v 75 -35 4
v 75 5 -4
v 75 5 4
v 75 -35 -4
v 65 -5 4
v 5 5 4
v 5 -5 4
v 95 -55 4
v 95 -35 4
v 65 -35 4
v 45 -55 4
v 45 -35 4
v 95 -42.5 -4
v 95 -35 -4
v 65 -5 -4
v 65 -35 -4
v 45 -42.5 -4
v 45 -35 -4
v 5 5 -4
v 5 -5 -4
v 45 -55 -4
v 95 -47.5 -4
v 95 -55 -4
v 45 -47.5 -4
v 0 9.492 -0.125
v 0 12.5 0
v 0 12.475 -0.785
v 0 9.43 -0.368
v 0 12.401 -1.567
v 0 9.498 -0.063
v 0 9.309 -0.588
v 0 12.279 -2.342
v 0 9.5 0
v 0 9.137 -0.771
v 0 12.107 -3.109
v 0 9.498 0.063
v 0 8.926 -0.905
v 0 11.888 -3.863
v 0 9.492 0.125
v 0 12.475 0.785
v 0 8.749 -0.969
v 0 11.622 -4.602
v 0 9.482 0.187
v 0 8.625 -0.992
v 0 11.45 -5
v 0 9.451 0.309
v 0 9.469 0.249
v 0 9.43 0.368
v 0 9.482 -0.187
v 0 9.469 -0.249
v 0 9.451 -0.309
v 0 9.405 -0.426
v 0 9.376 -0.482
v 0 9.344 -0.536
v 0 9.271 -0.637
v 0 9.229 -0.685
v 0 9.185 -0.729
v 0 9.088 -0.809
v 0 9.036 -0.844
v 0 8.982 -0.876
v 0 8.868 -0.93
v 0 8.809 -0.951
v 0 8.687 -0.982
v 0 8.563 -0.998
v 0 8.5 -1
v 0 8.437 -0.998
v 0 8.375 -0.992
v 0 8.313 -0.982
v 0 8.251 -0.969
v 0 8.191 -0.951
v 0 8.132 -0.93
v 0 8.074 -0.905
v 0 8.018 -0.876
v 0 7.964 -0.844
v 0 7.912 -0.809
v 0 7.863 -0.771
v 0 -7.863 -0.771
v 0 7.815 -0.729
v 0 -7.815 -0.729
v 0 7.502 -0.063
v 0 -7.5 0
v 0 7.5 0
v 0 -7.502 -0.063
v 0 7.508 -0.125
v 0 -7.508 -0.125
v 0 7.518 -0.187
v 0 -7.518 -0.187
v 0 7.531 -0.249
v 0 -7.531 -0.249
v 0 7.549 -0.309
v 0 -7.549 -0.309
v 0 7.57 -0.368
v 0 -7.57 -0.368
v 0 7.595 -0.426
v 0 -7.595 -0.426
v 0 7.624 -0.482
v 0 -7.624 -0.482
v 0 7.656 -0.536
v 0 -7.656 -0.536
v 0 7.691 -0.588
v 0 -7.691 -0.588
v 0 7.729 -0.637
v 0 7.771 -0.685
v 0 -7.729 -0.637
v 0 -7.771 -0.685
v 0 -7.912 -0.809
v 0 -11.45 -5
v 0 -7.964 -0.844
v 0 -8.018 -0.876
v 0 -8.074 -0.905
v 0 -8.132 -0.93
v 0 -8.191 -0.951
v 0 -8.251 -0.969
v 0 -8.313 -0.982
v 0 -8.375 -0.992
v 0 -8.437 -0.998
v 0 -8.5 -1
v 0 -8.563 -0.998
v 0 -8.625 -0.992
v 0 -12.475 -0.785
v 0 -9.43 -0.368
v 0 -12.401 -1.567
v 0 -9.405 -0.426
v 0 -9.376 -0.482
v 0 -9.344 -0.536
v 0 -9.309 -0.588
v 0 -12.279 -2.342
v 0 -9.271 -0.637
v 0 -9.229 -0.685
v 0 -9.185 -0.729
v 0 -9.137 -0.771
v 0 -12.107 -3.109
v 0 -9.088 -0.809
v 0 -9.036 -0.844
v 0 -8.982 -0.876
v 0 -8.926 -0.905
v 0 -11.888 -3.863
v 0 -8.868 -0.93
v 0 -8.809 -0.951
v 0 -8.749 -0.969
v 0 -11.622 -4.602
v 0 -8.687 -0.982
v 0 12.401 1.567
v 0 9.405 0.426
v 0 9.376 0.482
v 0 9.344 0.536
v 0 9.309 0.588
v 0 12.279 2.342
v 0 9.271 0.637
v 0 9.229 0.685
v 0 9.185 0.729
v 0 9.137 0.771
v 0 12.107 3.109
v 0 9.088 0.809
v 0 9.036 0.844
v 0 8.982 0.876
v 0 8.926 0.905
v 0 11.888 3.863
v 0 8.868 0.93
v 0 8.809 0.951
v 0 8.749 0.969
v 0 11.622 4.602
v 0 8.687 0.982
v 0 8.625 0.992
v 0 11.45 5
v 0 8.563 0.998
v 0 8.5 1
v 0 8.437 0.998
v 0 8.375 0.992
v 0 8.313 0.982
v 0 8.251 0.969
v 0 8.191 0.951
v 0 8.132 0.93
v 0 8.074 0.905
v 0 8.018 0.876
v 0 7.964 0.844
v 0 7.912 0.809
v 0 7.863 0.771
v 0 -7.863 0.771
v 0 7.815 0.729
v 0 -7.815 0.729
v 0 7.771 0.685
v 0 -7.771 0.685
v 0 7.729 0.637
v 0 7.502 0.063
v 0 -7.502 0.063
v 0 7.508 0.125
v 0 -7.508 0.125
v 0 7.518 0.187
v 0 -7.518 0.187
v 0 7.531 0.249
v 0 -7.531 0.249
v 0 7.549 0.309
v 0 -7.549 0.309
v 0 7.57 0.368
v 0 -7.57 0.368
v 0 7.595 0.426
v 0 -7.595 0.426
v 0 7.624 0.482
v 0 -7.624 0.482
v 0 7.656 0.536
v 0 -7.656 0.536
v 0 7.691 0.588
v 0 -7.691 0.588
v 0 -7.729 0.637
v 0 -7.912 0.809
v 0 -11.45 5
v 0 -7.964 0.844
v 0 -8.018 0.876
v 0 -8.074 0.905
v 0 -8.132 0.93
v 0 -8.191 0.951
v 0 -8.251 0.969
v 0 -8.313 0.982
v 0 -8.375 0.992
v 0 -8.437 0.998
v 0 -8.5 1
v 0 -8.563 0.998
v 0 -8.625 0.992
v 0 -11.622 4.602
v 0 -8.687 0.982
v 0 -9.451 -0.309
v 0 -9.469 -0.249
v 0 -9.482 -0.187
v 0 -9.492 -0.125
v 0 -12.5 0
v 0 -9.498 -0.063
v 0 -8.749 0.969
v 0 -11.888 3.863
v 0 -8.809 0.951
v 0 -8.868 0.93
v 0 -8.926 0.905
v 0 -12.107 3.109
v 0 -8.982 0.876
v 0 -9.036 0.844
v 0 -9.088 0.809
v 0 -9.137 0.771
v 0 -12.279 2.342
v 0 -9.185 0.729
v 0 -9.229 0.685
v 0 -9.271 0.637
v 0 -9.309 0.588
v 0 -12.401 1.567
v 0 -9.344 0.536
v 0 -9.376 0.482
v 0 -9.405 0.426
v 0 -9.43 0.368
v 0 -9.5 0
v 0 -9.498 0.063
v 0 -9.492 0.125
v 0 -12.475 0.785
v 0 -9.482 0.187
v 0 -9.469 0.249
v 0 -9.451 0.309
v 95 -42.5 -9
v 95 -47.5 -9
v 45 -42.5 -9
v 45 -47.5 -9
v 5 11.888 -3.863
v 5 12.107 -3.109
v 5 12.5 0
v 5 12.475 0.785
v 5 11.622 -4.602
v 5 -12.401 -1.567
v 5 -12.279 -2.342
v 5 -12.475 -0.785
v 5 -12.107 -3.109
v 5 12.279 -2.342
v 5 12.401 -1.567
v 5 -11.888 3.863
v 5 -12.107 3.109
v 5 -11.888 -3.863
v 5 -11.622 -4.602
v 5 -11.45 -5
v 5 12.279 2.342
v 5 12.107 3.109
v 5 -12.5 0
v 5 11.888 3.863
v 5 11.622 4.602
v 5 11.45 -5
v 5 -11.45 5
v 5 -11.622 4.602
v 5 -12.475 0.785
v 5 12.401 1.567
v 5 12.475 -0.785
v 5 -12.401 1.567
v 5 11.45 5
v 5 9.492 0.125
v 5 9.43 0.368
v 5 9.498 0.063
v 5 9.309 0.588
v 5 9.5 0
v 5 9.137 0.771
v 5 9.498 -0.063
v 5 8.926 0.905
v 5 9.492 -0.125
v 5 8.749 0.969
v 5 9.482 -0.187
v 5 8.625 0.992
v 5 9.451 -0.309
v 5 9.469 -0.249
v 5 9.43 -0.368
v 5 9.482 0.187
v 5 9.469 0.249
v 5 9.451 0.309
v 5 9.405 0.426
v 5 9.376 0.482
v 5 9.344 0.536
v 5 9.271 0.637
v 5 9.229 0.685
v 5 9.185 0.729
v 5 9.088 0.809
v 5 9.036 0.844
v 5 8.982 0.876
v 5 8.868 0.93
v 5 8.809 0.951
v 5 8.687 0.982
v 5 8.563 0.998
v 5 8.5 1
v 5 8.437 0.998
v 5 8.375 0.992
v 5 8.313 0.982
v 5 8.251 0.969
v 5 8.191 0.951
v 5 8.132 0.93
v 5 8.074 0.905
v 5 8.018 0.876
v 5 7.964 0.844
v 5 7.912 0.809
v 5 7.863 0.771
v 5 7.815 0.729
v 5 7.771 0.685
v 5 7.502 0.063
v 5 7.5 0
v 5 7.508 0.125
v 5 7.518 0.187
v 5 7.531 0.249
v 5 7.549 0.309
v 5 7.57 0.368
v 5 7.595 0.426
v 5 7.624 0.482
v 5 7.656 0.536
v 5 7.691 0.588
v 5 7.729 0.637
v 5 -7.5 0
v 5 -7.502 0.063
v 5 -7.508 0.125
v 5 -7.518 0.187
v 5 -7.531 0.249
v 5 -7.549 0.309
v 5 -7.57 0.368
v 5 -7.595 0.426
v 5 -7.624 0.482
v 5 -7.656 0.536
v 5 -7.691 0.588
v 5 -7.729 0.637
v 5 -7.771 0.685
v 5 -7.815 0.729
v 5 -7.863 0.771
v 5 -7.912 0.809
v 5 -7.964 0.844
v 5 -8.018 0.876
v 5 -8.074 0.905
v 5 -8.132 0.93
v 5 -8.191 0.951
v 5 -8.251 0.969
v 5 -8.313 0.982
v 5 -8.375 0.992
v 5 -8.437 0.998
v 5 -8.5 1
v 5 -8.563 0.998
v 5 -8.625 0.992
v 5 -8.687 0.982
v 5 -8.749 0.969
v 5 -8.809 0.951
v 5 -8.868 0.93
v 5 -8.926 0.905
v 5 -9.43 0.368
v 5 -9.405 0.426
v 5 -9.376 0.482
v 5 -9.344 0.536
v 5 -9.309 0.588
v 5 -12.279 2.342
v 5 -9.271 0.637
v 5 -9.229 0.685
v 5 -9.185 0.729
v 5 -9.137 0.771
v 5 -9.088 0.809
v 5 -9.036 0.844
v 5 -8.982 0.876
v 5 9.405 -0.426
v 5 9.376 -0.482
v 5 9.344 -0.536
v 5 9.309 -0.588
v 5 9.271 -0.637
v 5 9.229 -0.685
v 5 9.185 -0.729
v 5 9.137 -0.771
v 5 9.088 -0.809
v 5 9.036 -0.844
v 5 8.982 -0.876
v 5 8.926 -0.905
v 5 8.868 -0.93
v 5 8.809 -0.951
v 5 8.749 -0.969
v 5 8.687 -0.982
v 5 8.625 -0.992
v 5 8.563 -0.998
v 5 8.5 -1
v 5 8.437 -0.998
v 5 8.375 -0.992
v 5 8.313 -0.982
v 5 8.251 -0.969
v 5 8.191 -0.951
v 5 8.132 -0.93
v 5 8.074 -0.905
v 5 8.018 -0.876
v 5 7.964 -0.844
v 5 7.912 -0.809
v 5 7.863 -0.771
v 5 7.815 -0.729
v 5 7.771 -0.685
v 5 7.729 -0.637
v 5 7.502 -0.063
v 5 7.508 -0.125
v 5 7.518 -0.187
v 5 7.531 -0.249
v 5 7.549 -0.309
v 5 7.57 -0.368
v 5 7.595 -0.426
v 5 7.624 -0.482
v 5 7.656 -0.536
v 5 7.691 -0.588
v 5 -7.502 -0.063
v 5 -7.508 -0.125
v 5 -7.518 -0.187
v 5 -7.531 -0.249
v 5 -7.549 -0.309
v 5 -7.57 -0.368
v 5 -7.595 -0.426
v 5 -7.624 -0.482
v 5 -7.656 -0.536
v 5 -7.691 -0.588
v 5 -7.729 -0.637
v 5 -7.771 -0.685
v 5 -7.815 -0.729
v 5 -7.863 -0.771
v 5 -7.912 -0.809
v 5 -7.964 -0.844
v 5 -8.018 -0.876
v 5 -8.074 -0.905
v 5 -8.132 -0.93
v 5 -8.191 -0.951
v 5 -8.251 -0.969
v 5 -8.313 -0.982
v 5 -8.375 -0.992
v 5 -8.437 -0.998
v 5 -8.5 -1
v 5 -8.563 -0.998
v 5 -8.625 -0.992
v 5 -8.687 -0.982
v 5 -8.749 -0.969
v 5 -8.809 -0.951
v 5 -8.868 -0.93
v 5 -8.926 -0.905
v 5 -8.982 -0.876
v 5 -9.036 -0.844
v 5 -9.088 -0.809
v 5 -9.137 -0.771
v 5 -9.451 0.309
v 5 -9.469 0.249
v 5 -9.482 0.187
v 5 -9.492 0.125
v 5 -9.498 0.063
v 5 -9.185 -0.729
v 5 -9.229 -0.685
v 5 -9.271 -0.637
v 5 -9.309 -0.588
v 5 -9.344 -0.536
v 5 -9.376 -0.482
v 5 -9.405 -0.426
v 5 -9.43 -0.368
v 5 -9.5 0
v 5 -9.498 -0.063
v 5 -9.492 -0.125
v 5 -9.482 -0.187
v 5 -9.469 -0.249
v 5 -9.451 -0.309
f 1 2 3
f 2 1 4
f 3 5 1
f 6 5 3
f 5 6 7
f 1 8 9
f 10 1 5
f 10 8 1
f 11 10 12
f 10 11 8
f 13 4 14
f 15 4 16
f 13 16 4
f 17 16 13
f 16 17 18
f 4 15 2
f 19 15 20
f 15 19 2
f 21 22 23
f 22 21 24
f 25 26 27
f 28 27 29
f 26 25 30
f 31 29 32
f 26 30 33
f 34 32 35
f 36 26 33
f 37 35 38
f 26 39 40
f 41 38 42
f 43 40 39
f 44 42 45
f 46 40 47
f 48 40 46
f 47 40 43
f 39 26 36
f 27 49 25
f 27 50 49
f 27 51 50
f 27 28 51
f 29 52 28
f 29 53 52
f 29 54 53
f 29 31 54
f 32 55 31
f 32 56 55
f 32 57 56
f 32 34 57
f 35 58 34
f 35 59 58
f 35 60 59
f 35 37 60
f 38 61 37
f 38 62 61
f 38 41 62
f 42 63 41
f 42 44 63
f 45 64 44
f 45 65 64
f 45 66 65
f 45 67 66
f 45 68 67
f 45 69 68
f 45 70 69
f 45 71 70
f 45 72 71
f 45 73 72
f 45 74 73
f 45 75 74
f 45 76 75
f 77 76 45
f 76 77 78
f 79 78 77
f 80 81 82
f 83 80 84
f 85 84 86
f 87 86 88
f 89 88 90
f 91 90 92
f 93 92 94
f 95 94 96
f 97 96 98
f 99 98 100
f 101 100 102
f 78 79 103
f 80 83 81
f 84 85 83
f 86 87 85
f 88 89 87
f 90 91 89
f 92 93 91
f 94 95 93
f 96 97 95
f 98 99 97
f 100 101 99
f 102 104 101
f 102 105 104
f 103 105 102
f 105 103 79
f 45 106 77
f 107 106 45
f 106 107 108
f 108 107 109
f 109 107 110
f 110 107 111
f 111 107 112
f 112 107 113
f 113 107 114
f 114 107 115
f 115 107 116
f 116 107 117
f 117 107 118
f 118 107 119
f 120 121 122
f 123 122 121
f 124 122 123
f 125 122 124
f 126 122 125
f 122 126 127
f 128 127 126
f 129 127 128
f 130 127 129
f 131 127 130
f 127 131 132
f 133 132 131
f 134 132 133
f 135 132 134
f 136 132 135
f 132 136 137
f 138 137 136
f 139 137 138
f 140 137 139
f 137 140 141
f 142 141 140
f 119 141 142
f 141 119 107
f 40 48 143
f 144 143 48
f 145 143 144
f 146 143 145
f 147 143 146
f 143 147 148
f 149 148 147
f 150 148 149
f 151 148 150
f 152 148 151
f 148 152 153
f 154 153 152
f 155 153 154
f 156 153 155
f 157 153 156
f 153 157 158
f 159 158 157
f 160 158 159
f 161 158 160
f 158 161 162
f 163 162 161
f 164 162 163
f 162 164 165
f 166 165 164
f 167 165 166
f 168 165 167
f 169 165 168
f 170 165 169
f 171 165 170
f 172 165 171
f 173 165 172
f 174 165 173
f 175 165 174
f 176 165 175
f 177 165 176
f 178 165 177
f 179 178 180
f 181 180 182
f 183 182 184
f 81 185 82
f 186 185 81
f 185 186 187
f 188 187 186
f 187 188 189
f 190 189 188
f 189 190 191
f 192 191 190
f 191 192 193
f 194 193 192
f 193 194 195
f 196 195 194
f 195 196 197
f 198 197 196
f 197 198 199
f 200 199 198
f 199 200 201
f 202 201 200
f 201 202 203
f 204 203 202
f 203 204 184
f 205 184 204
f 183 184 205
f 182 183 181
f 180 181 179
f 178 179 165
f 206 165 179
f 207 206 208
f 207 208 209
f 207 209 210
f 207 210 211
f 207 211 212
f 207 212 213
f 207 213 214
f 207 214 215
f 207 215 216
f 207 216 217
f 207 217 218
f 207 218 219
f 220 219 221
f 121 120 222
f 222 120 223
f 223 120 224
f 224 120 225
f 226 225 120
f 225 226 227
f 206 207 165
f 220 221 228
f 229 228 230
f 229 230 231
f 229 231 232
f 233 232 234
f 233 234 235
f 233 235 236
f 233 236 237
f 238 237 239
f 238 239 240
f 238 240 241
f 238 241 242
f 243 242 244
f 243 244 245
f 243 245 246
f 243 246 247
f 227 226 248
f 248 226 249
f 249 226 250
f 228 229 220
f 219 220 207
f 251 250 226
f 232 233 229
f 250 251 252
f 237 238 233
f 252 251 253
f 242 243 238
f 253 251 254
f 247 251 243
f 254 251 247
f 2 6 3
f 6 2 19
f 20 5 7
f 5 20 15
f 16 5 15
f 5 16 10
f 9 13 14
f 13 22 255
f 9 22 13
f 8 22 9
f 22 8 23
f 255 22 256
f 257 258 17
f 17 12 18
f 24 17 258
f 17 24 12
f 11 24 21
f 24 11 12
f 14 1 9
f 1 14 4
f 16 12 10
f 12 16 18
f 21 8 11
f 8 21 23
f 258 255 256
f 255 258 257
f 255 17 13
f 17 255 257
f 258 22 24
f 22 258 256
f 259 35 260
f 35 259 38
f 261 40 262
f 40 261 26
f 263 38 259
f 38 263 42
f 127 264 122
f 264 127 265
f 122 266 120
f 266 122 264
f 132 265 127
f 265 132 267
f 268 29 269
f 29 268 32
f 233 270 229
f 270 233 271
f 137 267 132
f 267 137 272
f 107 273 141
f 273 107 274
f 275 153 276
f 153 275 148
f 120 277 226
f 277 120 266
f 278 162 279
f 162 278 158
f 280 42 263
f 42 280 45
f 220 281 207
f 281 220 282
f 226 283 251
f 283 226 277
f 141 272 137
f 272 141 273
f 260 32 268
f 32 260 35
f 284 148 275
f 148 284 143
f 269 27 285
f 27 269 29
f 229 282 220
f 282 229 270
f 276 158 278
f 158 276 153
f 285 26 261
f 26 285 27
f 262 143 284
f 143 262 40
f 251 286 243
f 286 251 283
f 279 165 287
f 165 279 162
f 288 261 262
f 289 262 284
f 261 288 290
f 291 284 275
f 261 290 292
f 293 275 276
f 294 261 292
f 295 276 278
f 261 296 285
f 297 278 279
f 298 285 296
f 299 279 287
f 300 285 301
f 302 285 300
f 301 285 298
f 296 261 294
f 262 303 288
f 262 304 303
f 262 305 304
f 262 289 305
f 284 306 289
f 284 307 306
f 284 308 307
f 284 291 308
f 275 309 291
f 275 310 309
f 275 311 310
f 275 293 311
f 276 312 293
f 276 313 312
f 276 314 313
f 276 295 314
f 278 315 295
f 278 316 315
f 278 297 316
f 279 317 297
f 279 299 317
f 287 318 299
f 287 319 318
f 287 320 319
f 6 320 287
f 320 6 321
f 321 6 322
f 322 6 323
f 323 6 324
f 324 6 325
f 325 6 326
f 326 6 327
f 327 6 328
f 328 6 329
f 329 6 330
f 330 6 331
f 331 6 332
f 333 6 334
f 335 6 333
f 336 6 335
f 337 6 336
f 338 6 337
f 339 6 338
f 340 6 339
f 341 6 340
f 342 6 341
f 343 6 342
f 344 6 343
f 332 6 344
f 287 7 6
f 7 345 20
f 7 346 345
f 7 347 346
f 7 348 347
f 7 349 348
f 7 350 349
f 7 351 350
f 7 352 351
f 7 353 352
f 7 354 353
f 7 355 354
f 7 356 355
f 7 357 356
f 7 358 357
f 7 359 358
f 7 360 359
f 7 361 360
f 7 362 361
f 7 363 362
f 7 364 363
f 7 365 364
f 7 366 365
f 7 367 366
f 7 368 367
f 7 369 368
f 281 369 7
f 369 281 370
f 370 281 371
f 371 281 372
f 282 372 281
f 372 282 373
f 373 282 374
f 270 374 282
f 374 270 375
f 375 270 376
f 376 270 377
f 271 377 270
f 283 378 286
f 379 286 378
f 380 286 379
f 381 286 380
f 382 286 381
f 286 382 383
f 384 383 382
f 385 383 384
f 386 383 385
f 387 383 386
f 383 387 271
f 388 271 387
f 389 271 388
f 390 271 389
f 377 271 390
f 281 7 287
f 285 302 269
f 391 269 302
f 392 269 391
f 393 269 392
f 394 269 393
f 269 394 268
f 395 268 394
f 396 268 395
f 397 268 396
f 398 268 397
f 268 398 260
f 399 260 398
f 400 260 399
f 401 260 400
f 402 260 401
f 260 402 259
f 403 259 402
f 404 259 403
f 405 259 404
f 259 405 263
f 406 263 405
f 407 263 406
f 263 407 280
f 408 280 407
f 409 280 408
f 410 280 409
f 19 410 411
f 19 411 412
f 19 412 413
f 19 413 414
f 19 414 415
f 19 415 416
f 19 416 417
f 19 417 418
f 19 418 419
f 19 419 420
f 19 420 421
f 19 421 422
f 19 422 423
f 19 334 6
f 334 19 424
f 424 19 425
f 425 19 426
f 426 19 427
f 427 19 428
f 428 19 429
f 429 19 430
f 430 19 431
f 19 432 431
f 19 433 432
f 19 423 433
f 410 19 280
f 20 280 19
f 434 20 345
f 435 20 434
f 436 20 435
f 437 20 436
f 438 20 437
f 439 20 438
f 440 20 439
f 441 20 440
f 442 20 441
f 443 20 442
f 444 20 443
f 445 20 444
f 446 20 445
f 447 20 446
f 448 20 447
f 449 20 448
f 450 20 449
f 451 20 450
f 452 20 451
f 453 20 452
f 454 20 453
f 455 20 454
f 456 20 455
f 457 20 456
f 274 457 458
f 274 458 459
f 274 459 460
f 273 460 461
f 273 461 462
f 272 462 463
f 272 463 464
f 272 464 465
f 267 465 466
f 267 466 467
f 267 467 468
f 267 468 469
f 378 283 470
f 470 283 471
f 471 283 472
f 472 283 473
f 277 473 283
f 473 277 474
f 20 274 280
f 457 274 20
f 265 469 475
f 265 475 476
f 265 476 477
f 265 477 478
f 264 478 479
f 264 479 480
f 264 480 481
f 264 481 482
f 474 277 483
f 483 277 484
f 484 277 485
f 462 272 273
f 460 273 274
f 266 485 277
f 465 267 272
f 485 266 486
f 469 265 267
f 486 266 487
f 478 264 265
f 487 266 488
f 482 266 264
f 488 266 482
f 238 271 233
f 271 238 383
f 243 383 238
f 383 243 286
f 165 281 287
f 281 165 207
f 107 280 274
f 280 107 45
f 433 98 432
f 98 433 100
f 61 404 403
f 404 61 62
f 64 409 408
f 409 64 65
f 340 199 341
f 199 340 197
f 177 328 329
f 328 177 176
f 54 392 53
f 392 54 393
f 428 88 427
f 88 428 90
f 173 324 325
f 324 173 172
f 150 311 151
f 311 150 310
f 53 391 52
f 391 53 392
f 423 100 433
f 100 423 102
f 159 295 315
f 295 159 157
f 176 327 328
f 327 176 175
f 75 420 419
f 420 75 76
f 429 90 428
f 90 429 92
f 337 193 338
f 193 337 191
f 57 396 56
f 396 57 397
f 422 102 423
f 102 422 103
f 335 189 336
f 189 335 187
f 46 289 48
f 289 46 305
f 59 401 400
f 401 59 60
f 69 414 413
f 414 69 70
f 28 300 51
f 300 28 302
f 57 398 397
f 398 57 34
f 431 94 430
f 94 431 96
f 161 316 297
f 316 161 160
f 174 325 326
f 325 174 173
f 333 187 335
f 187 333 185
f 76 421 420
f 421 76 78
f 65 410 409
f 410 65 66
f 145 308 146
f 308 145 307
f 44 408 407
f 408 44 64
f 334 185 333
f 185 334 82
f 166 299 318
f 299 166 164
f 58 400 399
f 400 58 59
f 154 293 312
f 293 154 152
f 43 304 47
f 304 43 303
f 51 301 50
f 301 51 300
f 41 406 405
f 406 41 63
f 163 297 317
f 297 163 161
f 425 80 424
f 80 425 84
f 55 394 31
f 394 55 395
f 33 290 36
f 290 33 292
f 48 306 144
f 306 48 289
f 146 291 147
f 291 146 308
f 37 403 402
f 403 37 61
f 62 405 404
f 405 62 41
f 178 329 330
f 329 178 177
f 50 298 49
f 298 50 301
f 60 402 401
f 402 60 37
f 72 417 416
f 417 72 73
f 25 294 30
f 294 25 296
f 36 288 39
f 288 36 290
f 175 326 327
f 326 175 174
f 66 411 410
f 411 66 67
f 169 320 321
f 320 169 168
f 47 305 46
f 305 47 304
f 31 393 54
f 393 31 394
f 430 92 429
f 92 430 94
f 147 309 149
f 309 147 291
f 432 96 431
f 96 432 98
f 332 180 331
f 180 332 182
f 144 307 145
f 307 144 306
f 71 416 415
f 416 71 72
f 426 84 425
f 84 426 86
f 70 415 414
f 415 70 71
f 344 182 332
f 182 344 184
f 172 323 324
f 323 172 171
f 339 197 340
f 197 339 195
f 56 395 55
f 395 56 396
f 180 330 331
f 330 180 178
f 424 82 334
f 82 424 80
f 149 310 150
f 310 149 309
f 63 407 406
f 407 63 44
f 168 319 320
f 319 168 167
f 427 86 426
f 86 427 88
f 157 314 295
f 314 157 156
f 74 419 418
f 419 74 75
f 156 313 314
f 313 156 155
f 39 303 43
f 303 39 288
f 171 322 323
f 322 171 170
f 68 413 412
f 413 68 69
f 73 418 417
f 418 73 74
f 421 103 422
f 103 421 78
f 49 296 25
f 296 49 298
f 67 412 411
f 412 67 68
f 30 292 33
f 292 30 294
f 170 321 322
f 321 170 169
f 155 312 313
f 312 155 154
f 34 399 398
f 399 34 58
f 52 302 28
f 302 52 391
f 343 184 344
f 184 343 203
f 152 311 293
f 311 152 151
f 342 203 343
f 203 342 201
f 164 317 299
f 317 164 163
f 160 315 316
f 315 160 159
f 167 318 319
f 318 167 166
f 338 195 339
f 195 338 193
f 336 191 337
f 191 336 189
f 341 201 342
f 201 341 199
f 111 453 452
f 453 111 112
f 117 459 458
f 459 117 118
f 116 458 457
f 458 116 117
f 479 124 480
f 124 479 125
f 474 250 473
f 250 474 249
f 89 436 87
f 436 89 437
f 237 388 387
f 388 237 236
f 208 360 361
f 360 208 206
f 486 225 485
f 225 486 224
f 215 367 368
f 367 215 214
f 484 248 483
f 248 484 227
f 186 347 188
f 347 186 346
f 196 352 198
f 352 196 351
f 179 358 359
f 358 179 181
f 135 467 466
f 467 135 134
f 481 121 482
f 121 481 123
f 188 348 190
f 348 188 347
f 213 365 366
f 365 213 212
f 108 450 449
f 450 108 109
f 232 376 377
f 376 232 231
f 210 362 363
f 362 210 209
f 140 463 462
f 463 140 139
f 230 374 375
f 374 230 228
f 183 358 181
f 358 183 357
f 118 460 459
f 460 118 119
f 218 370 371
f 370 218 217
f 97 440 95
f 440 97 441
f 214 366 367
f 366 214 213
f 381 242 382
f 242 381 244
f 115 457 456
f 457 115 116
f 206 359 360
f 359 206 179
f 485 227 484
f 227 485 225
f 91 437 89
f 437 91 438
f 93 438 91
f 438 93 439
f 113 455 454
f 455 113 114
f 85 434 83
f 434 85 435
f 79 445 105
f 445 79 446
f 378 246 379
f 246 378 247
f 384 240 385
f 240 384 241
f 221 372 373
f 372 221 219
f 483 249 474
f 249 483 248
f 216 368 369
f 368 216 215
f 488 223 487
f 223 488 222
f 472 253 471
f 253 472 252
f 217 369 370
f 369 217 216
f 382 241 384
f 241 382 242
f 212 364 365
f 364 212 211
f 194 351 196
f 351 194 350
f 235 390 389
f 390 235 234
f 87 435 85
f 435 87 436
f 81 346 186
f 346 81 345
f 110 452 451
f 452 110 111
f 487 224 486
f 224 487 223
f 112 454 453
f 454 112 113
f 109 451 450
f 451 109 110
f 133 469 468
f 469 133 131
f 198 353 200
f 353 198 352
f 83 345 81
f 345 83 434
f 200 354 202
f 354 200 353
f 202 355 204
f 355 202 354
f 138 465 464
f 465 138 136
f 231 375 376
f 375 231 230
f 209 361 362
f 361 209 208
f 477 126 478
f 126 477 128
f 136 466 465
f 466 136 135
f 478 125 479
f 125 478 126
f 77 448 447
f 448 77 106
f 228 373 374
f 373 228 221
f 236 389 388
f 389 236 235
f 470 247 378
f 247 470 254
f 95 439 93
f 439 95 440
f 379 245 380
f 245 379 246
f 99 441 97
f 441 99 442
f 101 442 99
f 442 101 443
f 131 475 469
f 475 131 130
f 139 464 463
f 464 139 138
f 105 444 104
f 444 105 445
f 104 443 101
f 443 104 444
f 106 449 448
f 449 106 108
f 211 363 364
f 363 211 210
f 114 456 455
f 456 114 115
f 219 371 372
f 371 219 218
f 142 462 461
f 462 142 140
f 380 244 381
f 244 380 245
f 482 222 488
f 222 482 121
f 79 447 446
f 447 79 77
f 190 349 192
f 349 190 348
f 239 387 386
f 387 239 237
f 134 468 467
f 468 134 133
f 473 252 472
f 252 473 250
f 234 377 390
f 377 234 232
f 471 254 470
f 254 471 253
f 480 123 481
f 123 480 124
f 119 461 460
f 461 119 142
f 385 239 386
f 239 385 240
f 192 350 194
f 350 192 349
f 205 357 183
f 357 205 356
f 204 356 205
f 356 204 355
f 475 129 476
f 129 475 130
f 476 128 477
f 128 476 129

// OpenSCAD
$fn=100;

module bras()
{
	translate([0,-5,-4]) cube([75,10,8]); //bras principal
	translate([65,-45,4]) rotate([0,90,0]) cube([8,40,10]); //bras secondaire
	translate([45,-55,4]) rotate([0,90,0]) cube([8,20,50]); //maintien tapis
	translate([45,-47.5,-4]) rotate([0,90,0]) cube([5,5,50]);
	
	

	
	
}

module vis()
{
	rotate([0,90,0]) translate([0,8.5,0]) cylinder(d=2, h=10);
	rotate([0,90,0]) translate([0,-8.5,0]) cylinder(d=2, h=10);
}

module base()
{
	difference()
	{
		rotate([0,90,0]) cylinder(d=25,h=5);
		translate([-5,-12.5,5]) cube([15,25,10]);
		translate([-5,-12.5,-15]) cube([15,25,10]);
	}
}


difference () 
{
	union() 
	{
		bras();
		base();
	}
	vis();
}
